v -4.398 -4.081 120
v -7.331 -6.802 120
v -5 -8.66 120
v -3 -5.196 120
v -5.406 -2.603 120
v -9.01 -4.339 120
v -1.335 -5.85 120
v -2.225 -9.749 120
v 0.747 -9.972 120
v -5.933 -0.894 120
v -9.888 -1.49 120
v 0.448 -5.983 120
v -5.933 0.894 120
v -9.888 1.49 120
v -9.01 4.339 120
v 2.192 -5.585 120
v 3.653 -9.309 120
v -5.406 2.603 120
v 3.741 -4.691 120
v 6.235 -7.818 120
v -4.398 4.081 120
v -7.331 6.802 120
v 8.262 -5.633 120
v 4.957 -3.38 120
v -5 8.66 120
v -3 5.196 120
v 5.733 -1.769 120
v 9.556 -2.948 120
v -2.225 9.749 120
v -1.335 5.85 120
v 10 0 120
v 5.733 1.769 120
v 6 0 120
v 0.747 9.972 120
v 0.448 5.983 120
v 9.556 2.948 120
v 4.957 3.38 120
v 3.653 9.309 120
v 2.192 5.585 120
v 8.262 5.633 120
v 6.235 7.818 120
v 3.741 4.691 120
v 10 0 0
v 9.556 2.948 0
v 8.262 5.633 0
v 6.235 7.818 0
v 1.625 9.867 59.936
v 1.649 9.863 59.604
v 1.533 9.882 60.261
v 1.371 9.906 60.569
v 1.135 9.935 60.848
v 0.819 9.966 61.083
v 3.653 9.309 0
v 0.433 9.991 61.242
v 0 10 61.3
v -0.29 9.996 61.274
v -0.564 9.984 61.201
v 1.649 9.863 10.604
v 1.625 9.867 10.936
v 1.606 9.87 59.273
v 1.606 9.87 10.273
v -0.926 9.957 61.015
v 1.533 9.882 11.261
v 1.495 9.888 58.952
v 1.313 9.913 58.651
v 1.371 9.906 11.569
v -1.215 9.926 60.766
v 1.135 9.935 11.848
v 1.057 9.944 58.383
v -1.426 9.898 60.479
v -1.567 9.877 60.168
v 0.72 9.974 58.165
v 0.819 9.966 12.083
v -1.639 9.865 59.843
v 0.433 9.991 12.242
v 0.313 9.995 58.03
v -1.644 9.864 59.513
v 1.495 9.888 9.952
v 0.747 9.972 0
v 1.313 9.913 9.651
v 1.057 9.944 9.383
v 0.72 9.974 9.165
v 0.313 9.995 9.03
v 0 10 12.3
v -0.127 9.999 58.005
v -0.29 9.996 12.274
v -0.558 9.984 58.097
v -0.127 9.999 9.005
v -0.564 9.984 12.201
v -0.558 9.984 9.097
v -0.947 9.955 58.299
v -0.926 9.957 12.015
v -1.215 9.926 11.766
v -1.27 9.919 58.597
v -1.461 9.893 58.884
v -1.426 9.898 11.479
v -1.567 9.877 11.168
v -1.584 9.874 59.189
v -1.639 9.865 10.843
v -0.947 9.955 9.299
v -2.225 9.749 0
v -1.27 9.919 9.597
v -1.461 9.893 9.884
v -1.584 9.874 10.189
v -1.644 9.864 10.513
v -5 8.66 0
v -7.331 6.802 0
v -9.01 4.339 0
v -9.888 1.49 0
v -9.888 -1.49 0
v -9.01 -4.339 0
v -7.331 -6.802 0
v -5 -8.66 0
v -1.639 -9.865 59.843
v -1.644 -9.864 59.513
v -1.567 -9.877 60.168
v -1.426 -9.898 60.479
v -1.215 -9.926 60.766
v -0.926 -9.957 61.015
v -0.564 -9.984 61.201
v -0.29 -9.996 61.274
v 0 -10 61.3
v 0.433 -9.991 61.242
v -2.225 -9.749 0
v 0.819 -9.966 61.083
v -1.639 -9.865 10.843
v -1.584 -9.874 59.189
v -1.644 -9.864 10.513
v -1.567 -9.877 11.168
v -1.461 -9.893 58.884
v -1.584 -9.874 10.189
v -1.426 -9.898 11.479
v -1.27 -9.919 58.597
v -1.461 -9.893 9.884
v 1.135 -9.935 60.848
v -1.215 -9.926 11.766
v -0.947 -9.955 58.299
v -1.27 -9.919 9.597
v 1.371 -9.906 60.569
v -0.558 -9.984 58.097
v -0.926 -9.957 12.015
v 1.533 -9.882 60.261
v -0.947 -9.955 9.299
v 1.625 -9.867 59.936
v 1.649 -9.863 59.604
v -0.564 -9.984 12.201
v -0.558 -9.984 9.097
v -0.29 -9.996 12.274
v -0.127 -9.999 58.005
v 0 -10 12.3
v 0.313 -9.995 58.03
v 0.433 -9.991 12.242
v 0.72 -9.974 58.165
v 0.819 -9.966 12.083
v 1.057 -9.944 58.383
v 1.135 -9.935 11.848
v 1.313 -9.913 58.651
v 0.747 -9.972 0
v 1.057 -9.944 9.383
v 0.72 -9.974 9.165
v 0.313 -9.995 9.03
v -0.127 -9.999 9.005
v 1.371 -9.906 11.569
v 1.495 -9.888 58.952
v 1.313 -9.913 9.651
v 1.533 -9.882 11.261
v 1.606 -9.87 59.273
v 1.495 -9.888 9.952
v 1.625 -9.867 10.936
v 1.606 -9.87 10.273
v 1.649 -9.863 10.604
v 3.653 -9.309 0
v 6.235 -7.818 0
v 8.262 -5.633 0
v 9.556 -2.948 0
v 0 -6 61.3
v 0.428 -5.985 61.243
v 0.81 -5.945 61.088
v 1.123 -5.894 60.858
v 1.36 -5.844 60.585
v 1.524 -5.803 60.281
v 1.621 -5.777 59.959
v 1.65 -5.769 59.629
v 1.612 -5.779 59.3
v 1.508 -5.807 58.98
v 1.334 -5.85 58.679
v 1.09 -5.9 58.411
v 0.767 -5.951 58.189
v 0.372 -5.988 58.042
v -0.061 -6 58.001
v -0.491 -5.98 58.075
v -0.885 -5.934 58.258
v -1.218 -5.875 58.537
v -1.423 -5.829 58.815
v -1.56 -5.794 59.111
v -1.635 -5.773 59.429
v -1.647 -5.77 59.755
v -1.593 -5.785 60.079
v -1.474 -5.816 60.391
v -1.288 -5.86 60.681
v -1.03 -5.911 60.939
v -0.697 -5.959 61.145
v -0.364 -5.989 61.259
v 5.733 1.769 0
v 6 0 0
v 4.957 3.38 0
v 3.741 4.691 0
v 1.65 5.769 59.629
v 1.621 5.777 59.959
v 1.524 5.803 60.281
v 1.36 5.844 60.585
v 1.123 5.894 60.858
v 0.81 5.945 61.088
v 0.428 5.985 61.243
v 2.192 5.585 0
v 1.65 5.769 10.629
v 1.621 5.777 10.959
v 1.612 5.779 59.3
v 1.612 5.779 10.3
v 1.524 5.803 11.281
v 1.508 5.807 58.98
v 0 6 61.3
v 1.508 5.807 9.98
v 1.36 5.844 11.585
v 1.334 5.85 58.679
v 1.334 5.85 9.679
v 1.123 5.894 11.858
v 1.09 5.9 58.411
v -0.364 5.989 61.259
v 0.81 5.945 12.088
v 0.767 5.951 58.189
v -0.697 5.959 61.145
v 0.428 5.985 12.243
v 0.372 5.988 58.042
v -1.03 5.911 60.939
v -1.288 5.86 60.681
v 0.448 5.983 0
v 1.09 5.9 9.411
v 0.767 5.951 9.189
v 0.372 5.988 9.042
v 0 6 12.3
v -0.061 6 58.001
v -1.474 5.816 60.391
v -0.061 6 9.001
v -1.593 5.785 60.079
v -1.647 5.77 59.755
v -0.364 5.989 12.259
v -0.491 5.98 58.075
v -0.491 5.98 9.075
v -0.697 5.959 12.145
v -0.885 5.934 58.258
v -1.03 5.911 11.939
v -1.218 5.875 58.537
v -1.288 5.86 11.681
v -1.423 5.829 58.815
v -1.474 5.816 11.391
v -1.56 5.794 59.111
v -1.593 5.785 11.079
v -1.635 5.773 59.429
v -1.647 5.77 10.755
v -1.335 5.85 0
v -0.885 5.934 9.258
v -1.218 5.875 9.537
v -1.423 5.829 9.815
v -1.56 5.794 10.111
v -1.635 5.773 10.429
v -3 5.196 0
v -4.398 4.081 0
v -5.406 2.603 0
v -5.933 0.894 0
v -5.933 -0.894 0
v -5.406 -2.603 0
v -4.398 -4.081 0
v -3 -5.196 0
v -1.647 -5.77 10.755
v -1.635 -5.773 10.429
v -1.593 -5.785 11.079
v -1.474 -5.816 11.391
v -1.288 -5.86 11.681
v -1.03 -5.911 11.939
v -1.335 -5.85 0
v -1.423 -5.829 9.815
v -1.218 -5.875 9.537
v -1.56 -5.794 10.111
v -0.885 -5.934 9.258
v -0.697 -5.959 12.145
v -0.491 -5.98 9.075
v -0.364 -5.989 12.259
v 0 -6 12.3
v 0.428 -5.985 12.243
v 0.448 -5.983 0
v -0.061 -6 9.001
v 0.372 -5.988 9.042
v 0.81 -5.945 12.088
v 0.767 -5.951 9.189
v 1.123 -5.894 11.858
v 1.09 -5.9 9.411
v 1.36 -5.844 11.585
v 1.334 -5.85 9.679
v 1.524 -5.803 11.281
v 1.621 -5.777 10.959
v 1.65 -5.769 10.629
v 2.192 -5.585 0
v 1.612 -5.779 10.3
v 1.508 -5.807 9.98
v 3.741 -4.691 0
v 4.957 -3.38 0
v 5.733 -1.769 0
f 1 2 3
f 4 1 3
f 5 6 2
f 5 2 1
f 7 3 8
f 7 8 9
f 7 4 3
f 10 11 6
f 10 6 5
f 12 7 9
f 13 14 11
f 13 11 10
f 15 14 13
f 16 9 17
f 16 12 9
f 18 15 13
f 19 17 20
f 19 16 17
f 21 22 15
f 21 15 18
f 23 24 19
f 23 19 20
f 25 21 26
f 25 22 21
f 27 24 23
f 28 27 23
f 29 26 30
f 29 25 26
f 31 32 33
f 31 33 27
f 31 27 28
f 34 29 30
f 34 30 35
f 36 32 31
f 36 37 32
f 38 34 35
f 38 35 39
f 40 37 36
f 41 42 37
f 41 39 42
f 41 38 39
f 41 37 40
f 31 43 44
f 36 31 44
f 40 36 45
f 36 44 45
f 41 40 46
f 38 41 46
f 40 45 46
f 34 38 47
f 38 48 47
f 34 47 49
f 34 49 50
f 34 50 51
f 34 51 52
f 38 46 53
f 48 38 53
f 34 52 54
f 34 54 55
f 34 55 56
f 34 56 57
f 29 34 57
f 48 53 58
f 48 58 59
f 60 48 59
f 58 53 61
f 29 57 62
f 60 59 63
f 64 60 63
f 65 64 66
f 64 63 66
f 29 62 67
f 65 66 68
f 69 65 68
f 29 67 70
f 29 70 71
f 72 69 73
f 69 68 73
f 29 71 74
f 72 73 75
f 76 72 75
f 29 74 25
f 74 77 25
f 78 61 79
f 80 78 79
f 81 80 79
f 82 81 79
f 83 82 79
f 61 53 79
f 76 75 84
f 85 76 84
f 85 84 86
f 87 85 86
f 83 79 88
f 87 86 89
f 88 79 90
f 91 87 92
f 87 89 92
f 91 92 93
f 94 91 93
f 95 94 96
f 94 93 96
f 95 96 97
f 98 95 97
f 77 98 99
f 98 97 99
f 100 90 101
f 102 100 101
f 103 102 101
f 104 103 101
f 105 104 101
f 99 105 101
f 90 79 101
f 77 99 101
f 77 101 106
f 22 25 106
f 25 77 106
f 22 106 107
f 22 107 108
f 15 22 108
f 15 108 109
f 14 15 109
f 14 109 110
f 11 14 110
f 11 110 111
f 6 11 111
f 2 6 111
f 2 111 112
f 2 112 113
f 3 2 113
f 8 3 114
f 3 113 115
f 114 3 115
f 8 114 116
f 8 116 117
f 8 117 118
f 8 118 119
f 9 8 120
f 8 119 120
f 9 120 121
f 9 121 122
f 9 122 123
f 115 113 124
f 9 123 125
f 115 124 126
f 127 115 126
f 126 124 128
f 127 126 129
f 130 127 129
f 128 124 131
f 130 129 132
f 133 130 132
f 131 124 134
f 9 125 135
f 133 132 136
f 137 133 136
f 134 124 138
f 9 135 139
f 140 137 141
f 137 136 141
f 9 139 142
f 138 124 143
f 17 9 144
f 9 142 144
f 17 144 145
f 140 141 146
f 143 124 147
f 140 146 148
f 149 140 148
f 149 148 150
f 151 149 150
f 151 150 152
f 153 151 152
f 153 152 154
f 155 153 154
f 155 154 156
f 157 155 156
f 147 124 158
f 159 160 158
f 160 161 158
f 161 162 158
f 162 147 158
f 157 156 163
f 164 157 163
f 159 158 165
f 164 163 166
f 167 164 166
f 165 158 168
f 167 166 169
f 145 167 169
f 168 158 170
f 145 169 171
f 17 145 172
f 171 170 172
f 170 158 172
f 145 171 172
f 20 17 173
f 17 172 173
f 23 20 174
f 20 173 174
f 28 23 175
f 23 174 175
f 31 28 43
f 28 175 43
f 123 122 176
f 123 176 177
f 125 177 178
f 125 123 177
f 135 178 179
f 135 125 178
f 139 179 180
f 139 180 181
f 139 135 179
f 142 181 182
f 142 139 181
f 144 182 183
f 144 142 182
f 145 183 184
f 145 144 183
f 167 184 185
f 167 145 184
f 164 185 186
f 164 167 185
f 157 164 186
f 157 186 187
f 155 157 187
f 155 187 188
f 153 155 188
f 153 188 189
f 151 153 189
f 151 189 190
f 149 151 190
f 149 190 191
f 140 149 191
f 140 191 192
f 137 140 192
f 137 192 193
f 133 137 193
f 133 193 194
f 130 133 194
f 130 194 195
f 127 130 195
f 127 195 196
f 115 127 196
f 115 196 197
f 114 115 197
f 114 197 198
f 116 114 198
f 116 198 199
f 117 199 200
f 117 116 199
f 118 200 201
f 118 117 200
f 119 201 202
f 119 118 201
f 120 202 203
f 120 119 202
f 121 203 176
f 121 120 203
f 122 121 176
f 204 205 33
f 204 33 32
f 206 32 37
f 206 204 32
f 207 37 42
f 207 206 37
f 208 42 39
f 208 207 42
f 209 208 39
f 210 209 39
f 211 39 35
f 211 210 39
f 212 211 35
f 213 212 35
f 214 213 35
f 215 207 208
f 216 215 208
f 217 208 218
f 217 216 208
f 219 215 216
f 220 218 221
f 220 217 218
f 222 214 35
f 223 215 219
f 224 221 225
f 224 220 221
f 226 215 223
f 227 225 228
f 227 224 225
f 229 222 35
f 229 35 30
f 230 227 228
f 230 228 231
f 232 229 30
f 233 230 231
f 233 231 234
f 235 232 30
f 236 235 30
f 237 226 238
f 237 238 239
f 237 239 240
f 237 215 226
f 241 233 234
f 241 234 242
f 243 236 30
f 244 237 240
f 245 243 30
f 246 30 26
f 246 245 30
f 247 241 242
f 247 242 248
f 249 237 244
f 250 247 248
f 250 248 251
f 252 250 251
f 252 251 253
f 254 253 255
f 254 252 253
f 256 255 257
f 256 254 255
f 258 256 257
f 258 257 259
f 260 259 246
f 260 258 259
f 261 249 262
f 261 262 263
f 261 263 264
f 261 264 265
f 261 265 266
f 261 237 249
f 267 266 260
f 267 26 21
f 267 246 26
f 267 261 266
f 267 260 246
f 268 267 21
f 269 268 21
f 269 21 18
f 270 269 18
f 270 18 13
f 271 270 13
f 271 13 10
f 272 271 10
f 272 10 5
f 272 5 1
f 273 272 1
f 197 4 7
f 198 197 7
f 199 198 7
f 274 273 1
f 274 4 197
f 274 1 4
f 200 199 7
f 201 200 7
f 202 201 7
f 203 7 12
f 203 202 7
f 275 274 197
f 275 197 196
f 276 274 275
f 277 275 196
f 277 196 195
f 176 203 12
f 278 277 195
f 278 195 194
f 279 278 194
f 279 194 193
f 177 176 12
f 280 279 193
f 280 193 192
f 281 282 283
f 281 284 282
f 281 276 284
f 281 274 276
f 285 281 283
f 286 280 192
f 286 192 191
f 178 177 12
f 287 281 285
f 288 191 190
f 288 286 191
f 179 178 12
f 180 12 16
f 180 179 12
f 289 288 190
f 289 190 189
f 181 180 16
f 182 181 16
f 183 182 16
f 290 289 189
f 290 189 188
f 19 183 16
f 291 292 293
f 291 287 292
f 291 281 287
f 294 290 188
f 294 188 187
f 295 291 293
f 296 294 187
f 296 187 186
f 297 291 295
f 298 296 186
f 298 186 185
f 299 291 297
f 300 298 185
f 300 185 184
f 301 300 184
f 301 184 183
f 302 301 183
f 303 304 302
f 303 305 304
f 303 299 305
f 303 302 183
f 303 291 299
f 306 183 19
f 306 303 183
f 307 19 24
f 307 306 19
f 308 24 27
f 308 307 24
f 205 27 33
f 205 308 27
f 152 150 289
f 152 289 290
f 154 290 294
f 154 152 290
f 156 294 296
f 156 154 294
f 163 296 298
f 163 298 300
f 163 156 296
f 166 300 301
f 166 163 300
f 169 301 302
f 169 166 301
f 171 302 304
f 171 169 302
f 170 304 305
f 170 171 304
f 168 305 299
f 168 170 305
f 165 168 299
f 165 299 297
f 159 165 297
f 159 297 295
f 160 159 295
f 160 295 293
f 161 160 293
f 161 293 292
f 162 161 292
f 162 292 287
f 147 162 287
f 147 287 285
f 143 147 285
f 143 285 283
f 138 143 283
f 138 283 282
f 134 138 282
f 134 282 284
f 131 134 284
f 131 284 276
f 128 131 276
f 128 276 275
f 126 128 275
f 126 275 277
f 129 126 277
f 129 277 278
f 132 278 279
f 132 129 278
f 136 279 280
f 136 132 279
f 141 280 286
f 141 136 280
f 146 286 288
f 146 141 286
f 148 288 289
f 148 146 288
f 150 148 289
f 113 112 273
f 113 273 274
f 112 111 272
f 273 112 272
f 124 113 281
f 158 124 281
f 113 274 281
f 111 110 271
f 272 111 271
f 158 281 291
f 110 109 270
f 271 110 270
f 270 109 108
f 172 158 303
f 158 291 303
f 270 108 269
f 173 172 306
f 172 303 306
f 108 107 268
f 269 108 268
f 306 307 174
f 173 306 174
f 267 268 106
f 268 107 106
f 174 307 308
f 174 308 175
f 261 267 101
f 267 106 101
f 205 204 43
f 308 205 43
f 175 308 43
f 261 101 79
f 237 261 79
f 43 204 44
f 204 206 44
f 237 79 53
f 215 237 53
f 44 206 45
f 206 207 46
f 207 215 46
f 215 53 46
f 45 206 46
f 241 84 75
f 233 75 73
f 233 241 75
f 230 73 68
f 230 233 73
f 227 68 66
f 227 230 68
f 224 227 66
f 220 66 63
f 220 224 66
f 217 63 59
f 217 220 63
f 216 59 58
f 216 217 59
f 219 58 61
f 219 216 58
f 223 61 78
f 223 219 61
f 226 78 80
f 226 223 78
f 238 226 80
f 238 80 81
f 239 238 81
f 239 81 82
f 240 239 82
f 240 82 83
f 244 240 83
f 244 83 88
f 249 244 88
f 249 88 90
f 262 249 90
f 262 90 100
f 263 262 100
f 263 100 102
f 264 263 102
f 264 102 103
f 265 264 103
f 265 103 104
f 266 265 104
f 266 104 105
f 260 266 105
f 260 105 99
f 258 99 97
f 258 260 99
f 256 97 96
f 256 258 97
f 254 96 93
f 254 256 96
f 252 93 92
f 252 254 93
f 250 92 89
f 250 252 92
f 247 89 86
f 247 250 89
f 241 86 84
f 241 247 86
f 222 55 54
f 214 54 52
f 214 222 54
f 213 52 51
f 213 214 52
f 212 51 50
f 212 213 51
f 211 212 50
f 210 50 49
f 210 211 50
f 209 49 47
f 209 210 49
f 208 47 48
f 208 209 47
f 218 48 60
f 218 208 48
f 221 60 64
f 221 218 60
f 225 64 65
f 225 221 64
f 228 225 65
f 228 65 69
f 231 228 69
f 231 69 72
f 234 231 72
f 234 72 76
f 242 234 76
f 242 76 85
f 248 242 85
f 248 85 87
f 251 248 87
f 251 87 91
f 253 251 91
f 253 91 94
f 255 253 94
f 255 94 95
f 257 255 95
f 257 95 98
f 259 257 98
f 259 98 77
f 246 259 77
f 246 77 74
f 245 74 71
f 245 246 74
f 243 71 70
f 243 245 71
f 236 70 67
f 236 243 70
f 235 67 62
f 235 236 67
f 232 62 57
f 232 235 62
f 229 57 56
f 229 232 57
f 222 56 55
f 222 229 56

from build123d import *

# Parameters (mm, degrees)
SKETCH_1_R               = 10
SKETCH_1_R_2             = 6
EXTRUDE_1_DEPTH          = 120
CUT_EXTRUDE_1_DEPTH      = 121.830459736
CUT_EXTRUDE_1_DEPTH_BACK = 121.830459736
SKETCH_2_R               = 1.65


with BuildPart() as part:
    # Эскиз1 → Бобышка-Вытянуть1 (new body)
    with BuildSketch(Plane.XY):
        Circle(SKETCH_1_R)
        Circle(SKETCH_1_R_2, mode=Mode.SUBTRACT)
    extrude(amount=EXTRUDE_1_DEPTH)

    # Эскиз2 → Вырез-Вытянуть1 (cut, two sides: drawn at the far end of the back side and taken through both)
    with BuildSketch(Plane(origin=(0, 0, 0), x_dir=(1, 0, 0), z_dir=(0, 1, 0)).offset(-CUT_EXTRUDE_1_DEPTH_BACK)):
        with Locations(Location((0, -10.65, 0), (0, 0, 270))):
            Circle(SKETCH_2_R)
        with Locations(Location((0, -59.65, 0), (0, 0, 270))):
            Circle(SKETCH_2_R)
    extrude(amount=CUT_EXTRUDE_1_DEPTH + CUT_EXTRUDE_1_DEPTH_BACK, mode=Mode.SUBTRACT)


solid = part.part
